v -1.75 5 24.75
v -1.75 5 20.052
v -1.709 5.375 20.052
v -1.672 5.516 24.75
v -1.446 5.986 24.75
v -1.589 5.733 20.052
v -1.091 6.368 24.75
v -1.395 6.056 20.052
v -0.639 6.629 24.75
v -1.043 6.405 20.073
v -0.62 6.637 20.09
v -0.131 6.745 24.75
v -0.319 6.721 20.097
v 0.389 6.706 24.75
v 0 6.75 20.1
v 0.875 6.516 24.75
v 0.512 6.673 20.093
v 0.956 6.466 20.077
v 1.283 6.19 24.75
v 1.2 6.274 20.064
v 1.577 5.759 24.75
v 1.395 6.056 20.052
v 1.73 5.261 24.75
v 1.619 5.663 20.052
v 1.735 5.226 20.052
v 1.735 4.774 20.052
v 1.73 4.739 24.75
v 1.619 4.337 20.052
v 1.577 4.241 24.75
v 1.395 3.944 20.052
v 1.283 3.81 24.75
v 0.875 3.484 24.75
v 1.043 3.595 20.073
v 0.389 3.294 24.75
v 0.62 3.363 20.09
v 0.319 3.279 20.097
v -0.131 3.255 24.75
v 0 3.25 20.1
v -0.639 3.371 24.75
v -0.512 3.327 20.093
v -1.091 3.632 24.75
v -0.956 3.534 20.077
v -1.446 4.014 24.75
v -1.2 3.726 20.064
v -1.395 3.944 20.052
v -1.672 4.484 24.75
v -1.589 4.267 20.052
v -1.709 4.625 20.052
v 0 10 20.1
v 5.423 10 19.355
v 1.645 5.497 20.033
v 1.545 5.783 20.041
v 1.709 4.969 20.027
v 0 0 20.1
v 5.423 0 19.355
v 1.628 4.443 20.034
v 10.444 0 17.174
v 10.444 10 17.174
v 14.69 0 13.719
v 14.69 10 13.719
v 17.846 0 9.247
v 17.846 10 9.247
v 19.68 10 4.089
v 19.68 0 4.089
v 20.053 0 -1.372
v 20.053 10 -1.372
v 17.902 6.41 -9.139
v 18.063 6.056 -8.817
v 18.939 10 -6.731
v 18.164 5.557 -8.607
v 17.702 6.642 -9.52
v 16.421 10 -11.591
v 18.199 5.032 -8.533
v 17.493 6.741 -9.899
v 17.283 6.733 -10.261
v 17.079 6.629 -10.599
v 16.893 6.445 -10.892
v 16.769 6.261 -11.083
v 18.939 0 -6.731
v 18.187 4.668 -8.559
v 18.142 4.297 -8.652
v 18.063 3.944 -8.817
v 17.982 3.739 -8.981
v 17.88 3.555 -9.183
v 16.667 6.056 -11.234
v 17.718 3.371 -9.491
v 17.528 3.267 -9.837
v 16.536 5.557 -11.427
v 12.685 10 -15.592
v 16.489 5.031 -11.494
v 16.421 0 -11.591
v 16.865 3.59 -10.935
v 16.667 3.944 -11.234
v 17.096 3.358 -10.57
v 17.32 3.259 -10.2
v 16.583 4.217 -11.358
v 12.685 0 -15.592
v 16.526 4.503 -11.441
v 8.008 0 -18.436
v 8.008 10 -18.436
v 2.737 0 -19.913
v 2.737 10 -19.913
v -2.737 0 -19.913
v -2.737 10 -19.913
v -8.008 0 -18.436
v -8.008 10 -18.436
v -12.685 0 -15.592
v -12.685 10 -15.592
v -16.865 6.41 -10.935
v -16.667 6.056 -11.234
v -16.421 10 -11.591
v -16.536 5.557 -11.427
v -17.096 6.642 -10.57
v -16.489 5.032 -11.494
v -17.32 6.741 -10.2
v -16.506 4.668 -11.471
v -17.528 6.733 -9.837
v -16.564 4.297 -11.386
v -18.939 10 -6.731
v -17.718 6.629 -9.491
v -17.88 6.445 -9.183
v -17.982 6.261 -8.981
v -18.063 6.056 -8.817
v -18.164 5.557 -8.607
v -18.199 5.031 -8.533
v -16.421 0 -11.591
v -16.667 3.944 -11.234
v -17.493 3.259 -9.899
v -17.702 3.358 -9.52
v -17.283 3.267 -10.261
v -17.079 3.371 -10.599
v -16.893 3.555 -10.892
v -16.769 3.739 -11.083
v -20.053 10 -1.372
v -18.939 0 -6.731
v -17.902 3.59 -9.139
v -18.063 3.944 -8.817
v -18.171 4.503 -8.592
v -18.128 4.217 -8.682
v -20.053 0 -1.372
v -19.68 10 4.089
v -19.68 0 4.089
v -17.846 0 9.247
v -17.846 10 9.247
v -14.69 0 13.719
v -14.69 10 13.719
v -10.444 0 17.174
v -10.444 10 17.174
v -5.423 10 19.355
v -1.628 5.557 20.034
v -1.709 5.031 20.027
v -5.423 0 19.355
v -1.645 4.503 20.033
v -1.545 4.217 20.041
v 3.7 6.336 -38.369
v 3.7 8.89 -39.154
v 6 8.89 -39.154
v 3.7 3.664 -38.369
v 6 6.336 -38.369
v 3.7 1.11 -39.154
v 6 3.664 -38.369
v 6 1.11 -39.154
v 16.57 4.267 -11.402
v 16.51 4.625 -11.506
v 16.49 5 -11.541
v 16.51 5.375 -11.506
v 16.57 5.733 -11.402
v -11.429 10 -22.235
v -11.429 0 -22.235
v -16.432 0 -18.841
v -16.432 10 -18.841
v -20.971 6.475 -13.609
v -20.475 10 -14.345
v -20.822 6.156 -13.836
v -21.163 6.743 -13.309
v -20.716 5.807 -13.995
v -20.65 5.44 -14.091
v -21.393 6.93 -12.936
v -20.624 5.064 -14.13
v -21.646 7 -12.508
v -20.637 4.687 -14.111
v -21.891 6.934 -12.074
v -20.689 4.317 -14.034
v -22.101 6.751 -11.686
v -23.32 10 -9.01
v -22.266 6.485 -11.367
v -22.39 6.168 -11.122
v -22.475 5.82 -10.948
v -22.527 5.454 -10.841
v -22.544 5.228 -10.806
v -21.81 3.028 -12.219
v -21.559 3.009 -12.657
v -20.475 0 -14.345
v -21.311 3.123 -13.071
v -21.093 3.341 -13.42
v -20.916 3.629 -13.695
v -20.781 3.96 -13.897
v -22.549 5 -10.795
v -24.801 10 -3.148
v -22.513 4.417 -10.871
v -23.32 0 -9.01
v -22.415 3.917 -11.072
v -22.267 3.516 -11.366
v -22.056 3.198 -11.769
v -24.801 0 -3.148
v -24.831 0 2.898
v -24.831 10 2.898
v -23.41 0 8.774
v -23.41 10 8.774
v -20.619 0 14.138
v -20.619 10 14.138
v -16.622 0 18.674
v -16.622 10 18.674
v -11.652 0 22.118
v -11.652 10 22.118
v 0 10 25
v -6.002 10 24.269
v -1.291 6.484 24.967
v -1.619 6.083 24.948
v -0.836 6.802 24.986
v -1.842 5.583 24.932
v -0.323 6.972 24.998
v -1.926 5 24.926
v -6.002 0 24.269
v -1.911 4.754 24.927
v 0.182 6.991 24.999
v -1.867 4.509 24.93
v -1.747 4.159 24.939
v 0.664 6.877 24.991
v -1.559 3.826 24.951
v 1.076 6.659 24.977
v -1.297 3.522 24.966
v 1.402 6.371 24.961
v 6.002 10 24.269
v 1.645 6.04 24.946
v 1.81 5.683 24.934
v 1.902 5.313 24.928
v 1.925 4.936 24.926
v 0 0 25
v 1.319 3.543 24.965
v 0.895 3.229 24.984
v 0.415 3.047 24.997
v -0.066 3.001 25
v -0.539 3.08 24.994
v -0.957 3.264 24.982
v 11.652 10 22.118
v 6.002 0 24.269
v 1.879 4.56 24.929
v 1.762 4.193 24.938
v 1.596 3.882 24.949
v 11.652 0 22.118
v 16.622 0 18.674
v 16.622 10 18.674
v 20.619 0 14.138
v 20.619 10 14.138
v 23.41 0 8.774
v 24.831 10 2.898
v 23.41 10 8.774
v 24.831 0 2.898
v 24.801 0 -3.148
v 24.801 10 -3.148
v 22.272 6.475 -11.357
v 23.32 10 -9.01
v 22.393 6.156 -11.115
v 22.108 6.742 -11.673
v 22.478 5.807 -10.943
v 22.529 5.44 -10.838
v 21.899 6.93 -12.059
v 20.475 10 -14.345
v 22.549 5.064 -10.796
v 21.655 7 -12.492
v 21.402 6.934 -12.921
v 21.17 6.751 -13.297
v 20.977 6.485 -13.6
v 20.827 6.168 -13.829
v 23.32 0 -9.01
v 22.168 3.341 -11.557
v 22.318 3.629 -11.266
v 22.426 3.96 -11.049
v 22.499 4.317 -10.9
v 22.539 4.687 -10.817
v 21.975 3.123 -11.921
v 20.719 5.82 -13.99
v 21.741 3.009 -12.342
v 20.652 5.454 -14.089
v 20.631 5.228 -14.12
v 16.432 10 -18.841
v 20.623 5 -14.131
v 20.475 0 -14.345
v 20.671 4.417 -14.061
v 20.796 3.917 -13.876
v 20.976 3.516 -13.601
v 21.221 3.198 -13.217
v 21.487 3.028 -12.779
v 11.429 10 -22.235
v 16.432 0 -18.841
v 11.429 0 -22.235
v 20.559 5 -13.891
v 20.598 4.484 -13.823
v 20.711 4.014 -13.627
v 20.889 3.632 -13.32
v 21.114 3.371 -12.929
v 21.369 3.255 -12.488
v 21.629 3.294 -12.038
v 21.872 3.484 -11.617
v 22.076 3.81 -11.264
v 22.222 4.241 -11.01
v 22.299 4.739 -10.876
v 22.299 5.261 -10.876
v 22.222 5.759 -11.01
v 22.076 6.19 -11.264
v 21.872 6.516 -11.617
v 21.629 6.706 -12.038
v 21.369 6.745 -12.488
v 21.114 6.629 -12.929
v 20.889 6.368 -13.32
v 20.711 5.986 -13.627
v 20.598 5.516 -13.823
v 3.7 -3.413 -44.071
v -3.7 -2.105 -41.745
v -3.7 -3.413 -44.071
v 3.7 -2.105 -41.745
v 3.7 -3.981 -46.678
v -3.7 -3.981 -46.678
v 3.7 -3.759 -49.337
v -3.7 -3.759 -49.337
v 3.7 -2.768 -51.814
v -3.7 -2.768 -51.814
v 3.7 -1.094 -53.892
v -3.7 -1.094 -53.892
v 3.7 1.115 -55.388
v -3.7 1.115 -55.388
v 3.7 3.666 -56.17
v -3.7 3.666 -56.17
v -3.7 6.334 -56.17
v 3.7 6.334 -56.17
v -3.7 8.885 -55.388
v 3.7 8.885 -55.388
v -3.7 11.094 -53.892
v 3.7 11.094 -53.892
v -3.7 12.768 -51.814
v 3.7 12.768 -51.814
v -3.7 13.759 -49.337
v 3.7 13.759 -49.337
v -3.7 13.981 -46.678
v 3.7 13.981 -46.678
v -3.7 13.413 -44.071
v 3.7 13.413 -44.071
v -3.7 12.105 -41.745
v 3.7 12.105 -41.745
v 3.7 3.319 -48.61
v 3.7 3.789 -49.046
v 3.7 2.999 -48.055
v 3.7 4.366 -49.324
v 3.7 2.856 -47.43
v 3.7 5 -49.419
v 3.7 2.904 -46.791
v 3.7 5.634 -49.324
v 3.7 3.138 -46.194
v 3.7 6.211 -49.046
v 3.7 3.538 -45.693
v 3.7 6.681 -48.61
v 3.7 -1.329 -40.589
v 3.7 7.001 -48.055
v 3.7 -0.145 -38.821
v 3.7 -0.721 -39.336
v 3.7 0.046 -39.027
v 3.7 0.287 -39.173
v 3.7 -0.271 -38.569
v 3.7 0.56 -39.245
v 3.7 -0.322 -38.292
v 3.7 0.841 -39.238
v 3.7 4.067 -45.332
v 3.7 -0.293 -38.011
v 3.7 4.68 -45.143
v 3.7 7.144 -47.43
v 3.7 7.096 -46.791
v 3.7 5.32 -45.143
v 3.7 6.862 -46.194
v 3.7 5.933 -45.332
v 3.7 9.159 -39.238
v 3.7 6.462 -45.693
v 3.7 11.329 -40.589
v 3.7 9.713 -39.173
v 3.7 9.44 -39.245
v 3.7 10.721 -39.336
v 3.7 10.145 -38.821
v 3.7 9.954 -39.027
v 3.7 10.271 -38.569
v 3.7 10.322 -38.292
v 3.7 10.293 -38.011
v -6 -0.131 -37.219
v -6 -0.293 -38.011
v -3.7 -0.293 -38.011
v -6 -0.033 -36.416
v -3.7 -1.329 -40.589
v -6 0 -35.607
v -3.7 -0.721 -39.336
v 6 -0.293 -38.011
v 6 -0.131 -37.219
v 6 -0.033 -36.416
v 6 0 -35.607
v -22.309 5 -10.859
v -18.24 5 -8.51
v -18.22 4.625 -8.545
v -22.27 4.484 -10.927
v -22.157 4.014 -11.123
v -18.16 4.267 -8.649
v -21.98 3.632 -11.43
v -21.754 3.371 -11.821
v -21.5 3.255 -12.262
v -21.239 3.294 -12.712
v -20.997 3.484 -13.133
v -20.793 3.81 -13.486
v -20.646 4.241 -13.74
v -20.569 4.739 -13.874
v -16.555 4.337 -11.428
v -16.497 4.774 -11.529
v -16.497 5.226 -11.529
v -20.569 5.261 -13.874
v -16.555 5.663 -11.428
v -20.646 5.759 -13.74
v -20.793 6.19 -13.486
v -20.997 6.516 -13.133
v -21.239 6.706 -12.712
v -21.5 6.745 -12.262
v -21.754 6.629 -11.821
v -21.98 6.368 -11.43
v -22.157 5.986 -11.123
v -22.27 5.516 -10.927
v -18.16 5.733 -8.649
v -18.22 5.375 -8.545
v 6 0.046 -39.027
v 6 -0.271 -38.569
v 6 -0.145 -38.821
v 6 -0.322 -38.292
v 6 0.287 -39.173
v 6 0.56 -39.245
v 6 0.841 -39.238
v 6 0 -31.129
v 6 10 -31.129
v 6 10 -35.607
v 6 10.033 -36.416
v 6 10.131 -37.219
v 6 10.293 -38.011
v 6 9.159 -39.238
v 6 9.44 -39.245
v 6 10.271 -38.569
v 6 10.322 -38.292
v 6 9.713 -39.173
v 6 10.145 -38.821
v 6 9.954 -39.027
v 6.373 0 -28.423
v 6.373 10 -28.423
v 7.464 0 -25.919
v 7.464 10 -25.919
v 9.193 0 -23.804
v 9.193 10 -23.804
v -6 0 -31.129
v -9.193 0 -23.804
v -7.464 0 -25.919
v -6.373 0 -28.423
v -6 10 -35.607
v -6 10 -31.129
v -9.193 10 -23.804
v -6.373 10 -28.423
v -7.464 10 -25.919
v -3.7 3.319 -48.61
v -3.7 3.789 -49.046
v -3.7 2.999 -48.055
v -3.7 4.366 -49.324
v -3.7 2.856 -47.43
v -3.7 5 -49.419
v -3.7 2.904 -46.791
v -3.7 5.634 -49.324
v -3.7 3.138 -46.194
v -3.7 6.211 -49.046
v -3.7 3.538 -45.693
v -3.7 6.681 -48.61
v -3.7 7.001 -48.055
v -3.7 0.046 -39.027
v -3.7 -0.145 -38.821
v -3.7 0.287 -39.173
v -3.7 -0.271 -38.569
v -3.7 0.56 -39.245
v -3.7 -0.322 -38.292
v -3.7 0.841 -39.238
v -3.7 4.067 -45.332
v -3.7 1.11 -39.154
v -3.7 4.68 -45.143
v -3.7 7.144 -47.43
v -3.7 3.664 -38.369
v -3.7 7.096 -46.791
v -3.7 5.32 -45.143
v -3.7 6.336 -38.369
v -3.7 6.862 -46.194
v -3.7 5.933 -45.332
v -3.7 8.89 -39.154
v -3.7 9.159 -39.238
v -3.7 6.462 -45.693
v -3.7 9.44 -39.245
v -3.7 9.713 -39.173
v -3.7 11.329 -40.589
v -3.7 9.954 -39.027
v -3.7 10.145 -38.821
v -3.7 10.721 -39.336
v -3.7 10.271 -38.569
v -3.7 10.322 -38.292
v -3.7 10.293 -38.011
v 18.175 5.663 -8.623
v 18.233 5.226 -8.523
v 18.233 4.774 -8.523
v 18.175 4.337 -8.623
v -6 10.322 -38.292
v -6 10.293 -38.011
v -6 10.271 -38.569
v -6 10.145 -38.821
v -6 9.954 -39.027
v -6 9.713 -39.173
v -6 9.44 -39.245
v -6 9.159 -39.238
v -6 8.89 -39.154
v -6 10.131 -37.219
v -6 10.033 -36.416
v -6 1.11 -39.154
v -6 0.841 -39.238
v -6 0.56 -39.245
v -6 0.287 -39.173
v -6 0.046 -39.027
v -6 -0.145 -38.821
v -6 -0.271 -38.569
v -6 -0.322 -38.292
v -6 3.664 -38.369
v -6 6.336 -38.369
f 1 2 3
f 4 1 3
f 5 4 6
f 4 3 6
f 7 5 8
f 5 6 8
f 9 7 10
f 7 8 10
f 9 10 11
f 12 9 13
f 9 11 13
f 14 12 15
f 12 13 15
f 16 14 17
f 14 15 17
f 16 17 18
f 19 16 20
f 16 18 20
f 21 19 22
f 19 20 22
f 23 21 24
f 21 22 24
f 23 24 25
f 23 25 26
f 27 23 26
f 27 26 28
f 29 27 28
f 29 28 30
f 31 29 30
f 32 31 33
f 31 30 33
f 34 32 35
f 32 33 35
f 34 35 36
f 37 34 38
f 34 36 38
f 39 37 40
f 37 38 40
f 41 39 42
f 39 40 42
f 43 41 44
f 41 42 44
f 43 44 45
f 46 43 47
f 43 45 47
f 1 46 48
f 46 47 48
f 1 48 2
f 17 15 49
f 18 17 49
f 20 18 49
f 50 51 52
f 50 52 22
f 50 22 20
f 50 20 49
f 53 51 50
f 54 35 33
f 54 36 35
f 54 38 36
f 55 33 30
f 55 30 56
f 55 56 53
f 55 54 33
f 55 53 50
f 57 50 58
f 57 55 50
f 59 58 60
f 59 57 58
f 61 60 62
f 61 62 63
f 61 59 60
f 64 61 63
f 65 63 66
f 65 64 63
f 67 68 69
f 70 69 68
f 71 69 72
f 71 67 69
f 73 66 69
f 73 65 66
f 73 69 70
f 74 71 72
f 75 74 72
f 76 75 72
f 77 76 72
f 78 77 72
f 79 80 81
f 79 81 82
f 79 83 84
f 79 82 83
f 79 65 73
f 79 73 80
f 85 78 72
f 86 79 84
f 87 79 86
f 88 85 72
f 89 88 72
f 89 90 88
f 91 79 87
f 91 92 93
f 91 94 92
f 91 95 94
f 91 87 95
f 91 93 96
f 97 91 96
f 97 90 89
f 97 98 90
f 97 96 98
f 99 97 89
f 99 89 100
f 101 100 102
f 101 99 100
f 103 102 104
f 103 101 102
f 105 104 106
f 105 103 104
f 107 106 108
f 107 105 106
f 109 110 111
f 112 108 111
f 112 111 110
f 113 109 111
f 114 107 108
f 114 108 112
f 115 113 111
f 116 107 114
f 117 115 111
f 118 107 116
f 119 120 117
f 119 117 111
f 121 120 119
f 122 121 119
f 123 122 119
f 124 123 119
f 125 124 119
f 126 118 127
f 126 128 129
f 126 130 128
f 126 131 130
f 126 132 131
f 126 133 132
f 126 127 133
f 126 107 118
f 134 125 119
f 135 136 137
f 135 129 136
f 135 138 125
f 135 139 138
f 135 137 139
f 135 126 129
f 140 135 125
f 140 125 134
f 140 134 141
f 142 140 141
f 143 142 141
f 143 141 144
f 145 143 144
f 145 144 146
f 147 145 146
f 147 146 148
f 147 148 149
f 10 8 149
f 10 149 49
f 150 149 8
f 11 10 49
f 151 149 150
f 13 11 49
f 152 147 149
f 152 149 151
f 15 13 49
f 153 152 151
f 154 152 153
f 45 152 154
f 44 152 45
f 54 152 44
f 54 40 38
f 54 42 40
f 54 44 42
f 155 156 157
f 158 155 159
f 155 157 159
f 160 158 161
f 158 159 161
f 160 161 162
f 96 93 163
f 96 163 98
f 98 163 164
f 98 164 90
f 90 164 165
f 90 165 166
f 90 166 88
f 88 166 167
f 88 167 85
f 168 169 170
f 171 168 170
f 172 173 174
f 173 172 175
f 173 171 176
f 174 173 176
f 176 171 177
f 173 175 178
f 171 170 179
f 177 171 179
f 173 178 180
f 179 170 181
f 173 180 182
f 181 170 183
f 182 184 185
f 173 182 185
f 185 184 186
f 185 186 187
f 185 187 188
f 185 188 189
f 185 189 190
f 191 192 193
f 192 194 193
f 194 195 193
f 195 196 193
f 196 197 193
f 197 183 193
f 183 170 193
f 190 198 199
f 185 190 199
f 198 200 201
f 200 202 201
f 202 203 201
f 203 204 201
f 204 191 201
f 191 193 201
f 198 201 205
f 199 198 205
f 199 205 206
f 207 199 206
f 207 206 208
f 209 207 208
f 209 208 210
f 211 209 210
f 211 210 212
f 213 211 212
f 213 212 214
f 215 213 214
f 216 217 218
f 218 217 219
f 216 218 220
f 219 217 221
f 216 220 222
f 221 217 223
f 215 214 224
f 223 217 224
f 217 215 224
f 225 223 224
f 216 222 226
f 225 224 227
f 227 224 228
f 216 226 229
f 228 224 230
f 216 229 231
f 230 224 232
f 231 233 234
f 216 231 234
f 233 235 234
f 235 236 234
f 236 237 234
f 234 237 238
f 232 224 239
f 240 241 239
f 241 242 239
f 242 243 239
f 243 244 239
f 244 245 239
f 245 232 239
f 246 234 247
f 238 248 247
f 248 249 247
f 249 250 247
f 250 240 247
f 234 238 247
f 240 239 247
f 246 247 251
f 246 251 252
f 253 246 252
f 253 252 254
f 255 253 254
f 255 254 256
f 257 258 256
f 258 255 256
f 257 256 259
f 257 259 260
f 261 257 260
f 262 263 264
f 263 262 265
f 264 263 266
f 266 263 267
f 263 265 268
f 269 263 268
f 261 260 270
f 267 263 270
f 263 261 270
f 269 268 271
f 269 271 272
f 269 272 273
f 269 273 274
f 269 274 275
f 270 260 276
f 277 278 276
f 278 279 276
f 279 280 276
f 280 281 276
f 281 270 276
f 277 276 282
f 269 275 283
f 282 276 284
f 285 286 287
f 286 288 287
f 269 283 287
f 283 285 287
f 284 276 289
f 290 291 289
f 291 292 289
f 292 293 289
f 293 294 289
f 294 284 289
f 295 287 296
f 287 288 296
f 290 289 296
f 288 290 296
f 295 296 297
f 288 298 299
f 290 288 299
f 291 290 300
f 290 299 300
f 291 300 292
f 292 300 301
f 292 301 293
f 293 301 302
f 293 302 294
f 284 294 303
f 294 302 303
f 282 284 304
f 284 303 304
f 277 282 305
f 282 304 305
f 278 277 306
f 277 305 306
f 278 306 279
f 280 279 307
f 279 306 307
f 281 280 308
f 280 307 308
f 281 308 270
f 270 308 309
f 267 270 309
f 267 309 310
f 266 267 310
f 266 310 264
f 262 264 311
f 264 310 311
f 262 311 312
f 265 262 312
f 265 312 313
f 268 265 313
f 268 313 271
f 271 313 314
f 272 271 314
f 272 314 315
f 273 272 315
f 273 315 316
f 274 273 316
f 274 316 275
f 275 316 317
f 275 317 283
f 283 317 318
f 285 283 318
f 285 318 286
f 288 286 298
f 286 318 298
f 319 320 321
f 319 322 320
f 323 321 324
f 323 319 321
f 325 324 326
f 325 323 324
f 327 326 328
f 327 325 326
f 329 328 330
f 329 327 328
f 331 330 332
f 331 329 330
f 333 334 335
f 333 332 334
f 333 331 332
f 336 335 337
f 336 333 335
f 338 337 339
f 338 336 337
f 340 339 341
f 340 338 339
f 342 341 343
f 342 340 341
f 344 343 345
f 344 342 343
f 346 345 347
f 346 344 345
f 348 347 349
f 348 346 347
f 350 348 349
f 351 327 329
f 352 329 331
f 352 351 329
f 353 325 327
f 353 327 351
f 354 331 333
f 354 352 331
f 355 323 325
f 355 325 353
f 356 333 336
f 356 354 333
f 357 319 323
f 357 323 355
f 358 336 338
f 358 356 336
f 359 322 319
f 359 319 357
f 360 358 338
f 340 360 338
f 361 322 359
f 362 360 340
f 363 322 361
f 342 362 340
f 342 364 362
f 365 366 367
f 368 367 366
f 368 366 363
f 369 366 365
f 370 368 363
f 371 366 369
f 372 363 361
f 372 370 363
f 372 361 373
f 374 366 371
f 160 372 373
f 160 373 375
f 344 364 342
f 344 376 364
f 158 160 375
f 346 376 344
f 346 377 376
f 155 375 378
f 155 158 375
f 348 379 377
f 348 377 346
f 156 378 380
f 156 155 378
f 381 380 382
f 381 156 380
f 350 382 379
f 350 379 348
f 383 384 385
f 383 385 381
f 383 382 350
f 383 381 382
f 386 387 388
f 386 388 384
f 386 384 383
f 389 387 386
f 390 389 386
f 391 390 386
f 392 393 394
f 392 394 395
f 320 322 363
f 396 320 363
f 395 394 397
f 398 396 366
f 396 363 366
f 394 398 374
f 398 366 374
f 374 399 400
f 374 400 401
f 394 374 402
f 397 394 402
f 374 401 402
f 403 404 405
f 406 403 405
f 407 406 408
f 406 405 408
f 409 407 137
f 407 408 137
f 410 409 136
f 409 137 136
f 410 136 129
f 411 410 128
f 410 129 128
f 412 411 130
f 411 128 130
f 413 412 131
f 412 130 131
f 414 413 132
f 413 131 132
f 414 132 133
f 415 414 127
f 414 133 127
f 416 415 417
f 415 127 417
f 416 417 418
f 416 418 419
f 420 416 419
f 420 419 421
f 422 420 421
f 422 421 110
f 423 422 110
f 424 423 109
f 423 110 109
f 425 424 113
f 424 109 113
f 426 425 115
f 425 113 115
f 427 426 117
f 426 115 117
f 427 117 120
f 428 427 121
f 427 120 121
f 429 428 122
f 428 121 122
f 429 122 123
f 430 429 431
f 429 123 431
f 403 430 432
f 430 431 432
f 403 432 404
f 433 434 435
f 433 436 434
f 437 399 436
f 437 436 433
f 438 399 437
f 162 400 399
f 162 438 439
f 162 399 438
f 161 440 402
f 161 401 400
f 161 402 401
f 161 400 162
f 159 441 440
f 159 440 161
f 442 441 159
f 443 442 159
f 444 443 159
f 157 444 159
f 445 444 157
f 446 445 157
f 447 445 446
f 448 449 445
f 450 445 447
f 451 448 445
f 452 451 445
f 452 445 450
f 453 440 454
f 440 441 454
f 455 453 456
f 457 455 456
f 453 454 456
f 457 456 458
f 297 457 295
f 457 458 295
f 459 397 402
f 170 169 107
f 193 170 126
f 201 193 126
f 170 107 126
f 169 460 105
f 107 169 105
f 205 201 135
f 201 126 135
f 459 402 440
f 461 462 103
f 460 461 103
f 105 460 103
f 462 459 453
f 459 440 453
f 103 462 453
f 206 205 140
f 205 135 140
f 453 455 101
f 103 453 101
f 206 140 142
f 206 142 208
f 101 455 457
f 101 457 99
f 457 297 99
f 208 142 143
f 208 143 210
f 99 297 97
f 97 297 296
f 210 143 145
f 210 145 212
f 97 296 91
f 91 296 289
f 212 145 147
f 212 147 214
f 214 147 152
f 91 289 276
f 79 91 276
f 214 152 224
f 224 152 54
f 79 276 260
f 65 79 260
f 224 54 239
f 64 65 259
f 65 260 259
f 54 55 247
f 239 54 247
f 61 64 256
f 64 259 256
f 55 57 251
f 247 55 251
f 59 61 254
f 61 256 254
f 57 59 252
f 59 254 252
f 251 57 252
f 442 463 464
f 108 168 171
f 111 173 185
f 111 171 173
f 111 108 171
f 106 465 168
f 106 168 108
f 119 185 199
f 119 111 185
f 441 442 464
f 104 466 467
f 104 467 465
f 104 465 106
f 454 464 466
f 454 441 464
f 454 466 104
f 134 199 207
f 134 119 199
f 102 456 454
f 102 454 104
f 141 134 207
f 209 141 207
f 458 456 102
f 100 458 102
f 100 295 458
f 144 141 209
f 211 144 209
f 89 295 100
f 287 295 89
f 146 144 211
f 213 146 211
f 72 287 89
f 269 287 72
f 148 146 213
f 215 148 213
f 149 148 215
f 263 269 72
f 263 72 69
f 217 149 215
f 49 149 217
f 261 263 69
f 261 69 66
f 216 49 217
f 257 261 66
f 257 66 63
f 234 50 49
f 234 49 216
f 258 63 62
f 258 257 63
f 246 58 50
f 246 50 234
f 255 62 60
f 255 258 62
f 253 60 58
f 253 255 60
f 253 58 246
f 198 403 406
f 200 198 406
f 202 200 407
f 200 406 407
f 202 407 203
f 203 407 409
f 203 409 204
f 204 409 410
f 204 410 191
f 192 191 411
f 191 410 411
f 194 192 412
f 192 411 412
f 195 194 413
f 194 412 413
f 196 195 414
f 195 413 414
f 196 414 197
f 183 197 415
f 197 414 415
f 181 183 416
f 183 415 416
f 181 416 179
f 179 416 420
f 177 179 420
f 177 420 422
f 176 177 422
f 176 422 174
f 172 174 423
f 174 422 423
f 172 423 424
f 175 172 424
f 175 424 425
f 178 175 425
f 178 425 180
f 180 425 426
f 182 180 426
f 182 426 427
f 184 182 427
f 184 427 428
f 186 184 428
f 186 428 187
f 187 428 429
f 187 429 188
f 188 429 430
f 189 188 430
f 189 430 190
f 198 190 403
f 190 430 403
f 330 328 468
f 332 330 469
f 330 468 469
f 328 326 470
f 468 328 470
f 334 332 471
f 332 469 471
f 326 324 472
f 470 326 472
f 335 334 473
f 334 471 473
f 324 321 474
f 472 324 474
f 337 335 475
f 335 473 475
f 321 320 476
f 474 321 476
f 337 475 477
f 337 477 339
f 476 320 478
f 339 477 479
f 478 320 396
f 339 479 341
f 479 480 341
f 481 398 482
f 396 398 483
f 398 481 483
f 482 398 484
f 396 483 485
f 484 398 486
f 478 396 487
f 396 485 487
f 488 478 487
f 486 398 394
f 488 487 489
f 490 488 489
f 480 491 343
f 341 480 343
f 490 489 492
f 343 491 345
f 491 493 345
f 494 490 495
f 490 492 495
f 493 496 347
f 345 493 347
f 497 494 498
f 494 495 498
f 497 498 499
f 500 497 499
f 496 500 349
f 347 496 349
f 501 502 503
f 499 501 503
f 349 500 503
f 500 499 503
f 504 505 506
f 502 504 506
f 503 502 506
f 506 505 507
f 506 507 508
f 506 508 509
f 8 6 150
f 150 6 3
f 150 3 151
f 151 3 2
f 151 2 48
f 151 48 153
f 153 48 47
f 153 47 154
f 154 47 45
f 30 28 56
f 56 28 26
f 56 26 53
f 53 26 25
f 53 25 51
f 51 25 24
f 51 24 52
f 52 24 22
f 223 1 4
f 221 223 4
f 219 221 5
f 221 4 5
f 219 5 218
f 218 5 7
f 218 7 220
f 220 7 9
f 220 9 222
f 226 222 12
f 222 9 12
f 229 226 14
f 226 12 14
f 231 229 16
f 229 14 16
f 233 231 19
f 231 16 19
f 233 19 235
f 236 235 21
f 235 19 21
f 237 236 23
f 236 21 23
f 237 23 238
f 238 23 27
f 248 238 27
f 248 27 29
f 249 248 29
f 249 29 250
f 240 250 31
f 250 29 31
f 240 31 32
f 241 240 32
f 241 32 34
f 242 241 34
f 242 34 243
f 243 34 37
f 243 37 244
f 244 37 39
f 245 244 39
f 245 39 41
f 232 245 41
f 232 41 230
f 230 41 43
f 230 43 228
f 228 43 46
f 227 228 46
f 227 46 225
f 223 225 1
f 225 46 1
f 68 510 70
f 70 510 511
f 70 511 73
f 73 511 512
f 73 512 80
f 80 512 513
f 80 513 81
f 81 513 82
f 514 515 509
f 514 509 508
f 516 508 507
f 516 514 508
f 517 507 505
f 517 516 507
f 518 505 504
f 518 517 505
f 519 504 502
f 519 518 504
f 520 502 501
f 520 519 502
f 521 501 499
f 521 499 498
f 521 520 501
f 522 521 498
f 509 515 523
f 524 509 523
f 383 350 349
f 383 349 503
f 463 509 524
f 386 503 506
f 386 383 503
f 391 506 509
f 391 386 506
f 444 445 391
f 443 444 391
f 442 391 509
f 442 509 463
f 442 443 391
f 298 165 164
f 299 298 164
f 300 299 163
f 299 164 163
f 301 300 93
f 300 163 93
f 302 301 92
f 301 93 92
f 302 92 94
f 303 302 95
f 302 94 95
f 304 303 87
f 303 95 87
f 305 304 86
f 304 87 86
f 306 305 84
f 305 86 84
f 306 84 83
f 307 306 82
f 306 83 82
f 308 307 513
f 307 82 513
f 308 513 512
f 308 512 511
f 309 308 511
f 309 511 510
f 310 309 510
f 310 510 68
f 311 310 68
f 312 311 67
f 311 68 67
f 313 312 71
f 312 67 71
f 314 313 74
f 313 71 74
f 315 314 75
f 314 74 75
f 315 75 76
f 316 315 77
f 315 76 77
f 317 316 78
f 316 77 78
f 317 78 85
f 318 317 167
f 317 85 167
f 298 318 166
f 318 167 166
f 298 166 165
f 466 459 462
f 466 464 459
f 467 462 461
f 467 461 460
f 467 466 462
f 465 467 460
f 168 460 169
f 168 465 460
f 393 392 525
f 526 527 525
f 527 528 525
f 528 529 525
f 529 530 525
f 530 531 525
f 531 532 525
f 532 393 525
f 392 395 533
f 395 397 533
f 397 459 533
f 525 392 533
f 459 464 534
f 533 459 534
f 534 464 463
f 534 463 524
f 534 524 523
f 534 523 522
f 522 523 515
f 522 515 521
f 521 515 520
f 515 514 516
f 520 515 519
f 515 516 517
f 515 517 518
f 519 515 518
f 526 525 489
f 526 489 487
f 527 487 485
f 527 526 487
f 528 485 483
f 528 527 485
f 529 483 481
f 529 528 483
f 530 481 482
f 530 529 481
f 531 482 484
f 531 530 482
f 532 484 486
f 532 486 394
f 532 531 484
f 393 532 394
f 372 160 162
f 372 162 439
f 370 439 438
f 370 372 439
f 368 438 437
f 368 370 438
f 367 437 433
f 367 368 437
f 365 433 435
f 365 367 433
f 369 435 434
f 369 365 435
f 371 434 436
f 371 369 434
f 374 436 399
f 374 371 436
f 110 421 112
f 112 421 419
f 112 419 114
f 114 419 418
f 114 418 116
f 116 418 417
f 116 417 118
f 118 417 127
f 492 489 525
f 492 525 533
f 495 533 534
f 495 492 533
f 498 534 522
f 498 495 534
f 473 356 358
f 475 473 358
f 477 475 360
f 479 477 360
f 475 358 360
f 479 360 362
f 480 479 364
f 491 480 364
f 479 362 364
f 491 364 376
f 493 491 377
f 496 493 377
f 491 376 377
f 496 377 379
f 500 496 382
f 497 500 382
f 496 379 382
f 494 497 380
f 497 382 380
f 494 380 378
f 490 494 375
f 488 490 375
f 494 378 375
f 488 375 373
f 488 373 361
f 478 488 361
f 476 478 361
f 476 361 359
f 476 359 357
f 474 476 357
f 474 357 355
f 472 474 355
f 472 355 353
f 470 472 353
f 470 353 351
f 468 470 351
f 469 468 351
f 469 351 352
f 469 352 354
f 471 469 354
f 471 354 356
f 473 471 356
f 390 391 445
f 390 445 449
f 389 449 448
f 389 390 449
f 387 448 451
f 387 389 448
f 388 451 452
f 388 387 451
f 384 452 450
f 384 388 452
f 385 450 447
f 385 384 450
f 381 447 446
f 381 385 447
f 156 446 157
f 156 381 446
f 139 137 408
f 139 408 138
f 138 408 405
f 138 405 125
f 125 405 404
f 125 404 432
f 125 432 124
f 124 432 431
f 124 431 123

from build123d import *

# Parameters (mm, degrees)
SKETCH_1_R                      = 25
SKETCH_1_R_2                    = 20.1
EXTRUDE_1_DEPTH                 = 10
EXTRUDE_START                   = -10
EXTRUDE_2_DEPTH                 = 10
SKETCH_3_R                      = 9
EXTRUDE_3_DEPTH                 = 6
SKETCH_4_R                      = 2.15
CUT_EXTRUDE_1_DEPTH             = 66.751324099
FILLET_1_R                      = 10
SKETCH_5_R                      = 9
CUT_EXTRUDE_2_DEPTH             = 2.3
CUT_EXTRUDE_START               = -2.3
SKETCH_6_R                      = 9
CUT_EXTRUDE_3_DEPTH             = 2.3
FILLET_START                    = -6
FILLET_2_DEPTH                  = 2.3
FILLET_START_2                  = 3.7
FILLET_2_2_DEPTH                = 2.3
F_3_0MM_1_D                     = 3.5
F_3_0MM_1_DEPTH                 = 4.948493917
F_3_0MM_1_CSINK_D               = 4
F_3_0MM_1_CSINK_ANGLE           = 90
F_3_0MM_1_TIP                   = 1.051506083
F_3_0MM_1_ON_FACE_2_D           = 3.5
F_3_0MM_1_ON_FACE_2_DEPTH       = 4.948493917
F_3_0MM_1_ON_FACE_2_CSINK_D     = 4
F_3_0MM_1_ON_FACE_2_CSINK_ANGLE = 90
F_3_0MM_1_ON_FACE_2_TIP         = 1.051506083
F_3_0MM_1_ON_FACE_3_D           = 3.5
F_3_0MM_1_ON_FACE_3_DEPTH       = 4.948493917
F_3_0MM_1_ON_FACE_3_CSINK_D     = 4
F_3_0MM_1_ON_FACE_3_CSINK_ANGLE = 90
F_3_0MM_1_ON_FACE_3_TIP         = 1.051506083


with BuildPart() as part:
    # 草图1 → 凸台-拉伸1 (new body)
    with BuildSketch(Plane(origin=(0, 0, 0), x_dir=(1, 0, 0), z_dir=(0, 1, 0))):
        with Locations(Location((0, 0, 0), (0, 0, 270))):
            Circle(SKETCH_1_R)
        with Locations(Location((0, 0, 0), (0, 0, 270))):
            Circle(SKETCH_1_R_2, mode=Mode.SUBTRACT)
    extrude(amount=EXTRUDE_1_DEPTH)

    # 草图2 → 凸台-拉伸2 (add)
    with BuildSketch(Plane(origin=(0, 10, 0), x_dir=(1, 0, 0), z_dir=(0, 1, 0)).offset(EXTRUDE_START)):
        with BuildLine():
            Line((-6, 24.269322199), (-6, 40.269322199))
            Line((-6, 40.269322199), (6, 40.269322199))
            Line((6, 40.269322199), (6, 24.269322199))
            ThreePointArc((6, 24.269322199), (0, 25), (-6, 24.269322199))
        make_face()
    extrude(amount=EXTRUDE_2_DEPTH)

    # 草图3 → 凸台-拉伸3 (add, symmetric)
    with BuildSketch(Plane(origin=(0, 0, 0), x_dir=(0, 0, -1), z_dir=(1, 0, 0))):
        with Locations((47.269322199, 5)):
            Circle(SKETCH_3_R)
    extrude(amount=EXTRUDE_3_DEPTH, both=True)

    # 草图4 → 切除-拉伸1 (cut, through all)
    with BuildSketch(Plane(origin=(6, 0, 0), x_dir=(0, 0, -1), z_dir=(1, 0, 0))):
        with Locations((47.269322199, 5)):
            Circle(SKETCH_4_R)
    extrude(amount=-CUT_EXTRUDE_1_DEPTH, mode=Mode.SUBTRACT)

    # 圆角1
    fillet_1_edges = [part.edges().sort_by_distance(p)[0] for p in [
        (6, 5, -24.269322199),
        (-6, 5, -24.269322199),
        (0, 10, -39.786007425),
        (0, 0, -39.786007425),
    ]]
    fillet(fillet_1_edges, radius=FILLET_1_R)

    # 草图5 → 切除-拉伸2 (cut)
    with BuildSketch(Plane(origin=(6, 0, 0), x_dir=(0, 0, -1), z_dir=(1, 0, 0))):
        with Locations((47.269322199, 5)):
            Circle(SKETCH_5_R)
    extrude(amount=-CUT_EXTRUDE_2_DEPTH, mode=Mode.SUBTRACT)

    # 草图6 → 切除-拉伸3 (cut)
    with BuildSketch(Plane.ZY.offset(6).offset(CUT_EXTRUDE_START)):
        with Locations((-47.269322199, 5)):
            Circle(SKETCH_6_R)
    extrude(amount=CUT_EXTRUDE_3_DEPTH, mode=Mode.SUBTRACT)

    # 圆角2: read off the stored shape, not the designer's step
    # 圆角2 outline → 圆角2 (cut)
    with BuildSketch(Plane.YZ.offset(FILLET_START)):
        with BuildLine():
            ThreePointArc((10.29326278, -38.011426009), (9.953936392, -39.027326957), (8.890330152, -39.153576312))
            ThreePointArc((8.890330152, -39.153576312), (10.648449114, -40.262538157), (12.105263158, -41.745262509))
            ThreePointArc((12.105263158, -41.745262509), (11.003425316, -39.973382673), (10.29326278, -38.011426009))
        make_face()
        with BuildLine():
            ThreePointArc((-2.105263158, -41.745262509), (-0.648449114, -40.262538157), (1.109669848, -39.153576312))
            ThreePointArc((1.109669848, -39.153576312), (0.046063608, -39.027326957), (-0.29326278, -38.011426009))
            ThreePointArc((-0.29326278, -38.011426009), (-1.003425316, -39.973382673), (-2.105263158, -41.745262509))
        make_face()
    extrude(amount=FILLET_2_DEPTH, mode=Mode.SUBTRACT)

    # Fillet 2 2 outline → Fillet 2 2 (cut)
    with BuildSketch(Plane.YZ.offset(FILLET_START_2)):
        with BuildLine():
            ThreePointArc((10.29326278, -38.011426009), (9.953936392, -39.027326957), (8.890330152, -39.153576312))
            ThreePointArc((8.890330152, -39.153576312), (10.648449114, -40.262538157), (12.105263158, -41.745262509))
            ThreePointArc((12.105263158, -41.745262509), (11.003425316, -39.973382673), (10.29326278, -38.011426009))
        make_face()
        with BuildLine():
            ThreePointArc((-2.105263158, -41.745262509), (-0.648449114, -40.262538157), (1.109669848, -39.153576312))
            ThreePointArc((1.109669848, -39.153576312), (0.046063608, -39.027326957), (-0.29326278, -38.011426009))
            ThreePointArc((-0.29326278, -38.011426009), (-1.003425316, -39.973382673), (-2.105263158, -41.745262509))
        make_face()
    extrude(amount=FILLET_2_2_DEPTH, mode=Mode.SUBTRACT)

    # Ø3.0mm 暗销孔1
    with Locations(Plane(origin=(0, 5, 25), x_dir=(1, 0, 0), z_dir=(0, 0, 1))):
        with Locations((0, 0)):
            CounterSinkHole(F_3_0MM_1_D / 2, F_3_0MM_1_CSINK_D / 2, depth=F_3_0MM_1_DEPTH, counter_sink_angle=F_3_0MM_1_CSINK_ANGLE)
            with Locations((0, 0, -(F_3_0MM_1_DEPTH + F_3_0MM_1_TIP / 2))):  # 118° drill point
                Cone(0, F_3_0MM_1_D / 2, F_3_0MM_1_TIP, mode=Mode.SUBTRACT)

    # Ø3.0mm 暗销孔1 on face 2
    with Locations(Plane(origin=(-21.650635095, 5, -12.5), x_dir=(0.500000174844, 0, -0.866025302838), z_dir=(-0.866025302838, 0, -0.500000174844))):
        with Locations((0, 0)):
            CounterSinkHole(F_3_0MM_1_ON_FACE_2_D / 2, F_3_0MM_1_ON_FACE_2_CSINK_D / 2, depth=F_3_0MM_1_ON_FACE_2_DEPTH, counter_sink_angle=F_3_0MM_1_ON_FACE_2_CSINK_ANGLE)
            with Locations((0, 0, -(F_3_0MM_1_ON_FACE_2_DEPTH + F_3_0MM_1_ON_FACE_2_TIP / 2))):  # 118° drill point
                Cone(0, F_3_0MM_1_ON_FACE_2_D / 2, F_3_0MM_1_ON_FACE_2_TIP, mode=Mode.SUBTRACT)

    # Ø3.0mm 暗销孔1 on face 3
    with Locations(Plane(origin=(21.650635095, 5, -12.5), x_dir=(0.500000174844, 0, 0.866025302838), z_dir=(0.866025302838, 0, -0.500000174844))):
        with Locations((0, 0)):
            CounterSinkHole(F_3_0MM_1_ON_FACE_3_D / 2, F_3_0MM_1_ON_FACE_3_CSINK_D / 2, depth=F_3_0MM_1_ON_FACE_3_DEPTH, counter_sink_angle=F_3_0MM_1_ON_FACE_3_CSINK_ANGLE)
            with Locations((0, 0, -(F_3_0MM_1_ON_FACE_3_DEPTH + F_3_0MM_1_ON_FACE_3_TIP / 2))):  # 118° drill point
                Cone(0, F_3_0MM_1_ON_FACE_3_D / 2, F_3_0MM_1_ON_FACE_3_TIP, mode=Mode.SUBTRACT)


solid = part.part
